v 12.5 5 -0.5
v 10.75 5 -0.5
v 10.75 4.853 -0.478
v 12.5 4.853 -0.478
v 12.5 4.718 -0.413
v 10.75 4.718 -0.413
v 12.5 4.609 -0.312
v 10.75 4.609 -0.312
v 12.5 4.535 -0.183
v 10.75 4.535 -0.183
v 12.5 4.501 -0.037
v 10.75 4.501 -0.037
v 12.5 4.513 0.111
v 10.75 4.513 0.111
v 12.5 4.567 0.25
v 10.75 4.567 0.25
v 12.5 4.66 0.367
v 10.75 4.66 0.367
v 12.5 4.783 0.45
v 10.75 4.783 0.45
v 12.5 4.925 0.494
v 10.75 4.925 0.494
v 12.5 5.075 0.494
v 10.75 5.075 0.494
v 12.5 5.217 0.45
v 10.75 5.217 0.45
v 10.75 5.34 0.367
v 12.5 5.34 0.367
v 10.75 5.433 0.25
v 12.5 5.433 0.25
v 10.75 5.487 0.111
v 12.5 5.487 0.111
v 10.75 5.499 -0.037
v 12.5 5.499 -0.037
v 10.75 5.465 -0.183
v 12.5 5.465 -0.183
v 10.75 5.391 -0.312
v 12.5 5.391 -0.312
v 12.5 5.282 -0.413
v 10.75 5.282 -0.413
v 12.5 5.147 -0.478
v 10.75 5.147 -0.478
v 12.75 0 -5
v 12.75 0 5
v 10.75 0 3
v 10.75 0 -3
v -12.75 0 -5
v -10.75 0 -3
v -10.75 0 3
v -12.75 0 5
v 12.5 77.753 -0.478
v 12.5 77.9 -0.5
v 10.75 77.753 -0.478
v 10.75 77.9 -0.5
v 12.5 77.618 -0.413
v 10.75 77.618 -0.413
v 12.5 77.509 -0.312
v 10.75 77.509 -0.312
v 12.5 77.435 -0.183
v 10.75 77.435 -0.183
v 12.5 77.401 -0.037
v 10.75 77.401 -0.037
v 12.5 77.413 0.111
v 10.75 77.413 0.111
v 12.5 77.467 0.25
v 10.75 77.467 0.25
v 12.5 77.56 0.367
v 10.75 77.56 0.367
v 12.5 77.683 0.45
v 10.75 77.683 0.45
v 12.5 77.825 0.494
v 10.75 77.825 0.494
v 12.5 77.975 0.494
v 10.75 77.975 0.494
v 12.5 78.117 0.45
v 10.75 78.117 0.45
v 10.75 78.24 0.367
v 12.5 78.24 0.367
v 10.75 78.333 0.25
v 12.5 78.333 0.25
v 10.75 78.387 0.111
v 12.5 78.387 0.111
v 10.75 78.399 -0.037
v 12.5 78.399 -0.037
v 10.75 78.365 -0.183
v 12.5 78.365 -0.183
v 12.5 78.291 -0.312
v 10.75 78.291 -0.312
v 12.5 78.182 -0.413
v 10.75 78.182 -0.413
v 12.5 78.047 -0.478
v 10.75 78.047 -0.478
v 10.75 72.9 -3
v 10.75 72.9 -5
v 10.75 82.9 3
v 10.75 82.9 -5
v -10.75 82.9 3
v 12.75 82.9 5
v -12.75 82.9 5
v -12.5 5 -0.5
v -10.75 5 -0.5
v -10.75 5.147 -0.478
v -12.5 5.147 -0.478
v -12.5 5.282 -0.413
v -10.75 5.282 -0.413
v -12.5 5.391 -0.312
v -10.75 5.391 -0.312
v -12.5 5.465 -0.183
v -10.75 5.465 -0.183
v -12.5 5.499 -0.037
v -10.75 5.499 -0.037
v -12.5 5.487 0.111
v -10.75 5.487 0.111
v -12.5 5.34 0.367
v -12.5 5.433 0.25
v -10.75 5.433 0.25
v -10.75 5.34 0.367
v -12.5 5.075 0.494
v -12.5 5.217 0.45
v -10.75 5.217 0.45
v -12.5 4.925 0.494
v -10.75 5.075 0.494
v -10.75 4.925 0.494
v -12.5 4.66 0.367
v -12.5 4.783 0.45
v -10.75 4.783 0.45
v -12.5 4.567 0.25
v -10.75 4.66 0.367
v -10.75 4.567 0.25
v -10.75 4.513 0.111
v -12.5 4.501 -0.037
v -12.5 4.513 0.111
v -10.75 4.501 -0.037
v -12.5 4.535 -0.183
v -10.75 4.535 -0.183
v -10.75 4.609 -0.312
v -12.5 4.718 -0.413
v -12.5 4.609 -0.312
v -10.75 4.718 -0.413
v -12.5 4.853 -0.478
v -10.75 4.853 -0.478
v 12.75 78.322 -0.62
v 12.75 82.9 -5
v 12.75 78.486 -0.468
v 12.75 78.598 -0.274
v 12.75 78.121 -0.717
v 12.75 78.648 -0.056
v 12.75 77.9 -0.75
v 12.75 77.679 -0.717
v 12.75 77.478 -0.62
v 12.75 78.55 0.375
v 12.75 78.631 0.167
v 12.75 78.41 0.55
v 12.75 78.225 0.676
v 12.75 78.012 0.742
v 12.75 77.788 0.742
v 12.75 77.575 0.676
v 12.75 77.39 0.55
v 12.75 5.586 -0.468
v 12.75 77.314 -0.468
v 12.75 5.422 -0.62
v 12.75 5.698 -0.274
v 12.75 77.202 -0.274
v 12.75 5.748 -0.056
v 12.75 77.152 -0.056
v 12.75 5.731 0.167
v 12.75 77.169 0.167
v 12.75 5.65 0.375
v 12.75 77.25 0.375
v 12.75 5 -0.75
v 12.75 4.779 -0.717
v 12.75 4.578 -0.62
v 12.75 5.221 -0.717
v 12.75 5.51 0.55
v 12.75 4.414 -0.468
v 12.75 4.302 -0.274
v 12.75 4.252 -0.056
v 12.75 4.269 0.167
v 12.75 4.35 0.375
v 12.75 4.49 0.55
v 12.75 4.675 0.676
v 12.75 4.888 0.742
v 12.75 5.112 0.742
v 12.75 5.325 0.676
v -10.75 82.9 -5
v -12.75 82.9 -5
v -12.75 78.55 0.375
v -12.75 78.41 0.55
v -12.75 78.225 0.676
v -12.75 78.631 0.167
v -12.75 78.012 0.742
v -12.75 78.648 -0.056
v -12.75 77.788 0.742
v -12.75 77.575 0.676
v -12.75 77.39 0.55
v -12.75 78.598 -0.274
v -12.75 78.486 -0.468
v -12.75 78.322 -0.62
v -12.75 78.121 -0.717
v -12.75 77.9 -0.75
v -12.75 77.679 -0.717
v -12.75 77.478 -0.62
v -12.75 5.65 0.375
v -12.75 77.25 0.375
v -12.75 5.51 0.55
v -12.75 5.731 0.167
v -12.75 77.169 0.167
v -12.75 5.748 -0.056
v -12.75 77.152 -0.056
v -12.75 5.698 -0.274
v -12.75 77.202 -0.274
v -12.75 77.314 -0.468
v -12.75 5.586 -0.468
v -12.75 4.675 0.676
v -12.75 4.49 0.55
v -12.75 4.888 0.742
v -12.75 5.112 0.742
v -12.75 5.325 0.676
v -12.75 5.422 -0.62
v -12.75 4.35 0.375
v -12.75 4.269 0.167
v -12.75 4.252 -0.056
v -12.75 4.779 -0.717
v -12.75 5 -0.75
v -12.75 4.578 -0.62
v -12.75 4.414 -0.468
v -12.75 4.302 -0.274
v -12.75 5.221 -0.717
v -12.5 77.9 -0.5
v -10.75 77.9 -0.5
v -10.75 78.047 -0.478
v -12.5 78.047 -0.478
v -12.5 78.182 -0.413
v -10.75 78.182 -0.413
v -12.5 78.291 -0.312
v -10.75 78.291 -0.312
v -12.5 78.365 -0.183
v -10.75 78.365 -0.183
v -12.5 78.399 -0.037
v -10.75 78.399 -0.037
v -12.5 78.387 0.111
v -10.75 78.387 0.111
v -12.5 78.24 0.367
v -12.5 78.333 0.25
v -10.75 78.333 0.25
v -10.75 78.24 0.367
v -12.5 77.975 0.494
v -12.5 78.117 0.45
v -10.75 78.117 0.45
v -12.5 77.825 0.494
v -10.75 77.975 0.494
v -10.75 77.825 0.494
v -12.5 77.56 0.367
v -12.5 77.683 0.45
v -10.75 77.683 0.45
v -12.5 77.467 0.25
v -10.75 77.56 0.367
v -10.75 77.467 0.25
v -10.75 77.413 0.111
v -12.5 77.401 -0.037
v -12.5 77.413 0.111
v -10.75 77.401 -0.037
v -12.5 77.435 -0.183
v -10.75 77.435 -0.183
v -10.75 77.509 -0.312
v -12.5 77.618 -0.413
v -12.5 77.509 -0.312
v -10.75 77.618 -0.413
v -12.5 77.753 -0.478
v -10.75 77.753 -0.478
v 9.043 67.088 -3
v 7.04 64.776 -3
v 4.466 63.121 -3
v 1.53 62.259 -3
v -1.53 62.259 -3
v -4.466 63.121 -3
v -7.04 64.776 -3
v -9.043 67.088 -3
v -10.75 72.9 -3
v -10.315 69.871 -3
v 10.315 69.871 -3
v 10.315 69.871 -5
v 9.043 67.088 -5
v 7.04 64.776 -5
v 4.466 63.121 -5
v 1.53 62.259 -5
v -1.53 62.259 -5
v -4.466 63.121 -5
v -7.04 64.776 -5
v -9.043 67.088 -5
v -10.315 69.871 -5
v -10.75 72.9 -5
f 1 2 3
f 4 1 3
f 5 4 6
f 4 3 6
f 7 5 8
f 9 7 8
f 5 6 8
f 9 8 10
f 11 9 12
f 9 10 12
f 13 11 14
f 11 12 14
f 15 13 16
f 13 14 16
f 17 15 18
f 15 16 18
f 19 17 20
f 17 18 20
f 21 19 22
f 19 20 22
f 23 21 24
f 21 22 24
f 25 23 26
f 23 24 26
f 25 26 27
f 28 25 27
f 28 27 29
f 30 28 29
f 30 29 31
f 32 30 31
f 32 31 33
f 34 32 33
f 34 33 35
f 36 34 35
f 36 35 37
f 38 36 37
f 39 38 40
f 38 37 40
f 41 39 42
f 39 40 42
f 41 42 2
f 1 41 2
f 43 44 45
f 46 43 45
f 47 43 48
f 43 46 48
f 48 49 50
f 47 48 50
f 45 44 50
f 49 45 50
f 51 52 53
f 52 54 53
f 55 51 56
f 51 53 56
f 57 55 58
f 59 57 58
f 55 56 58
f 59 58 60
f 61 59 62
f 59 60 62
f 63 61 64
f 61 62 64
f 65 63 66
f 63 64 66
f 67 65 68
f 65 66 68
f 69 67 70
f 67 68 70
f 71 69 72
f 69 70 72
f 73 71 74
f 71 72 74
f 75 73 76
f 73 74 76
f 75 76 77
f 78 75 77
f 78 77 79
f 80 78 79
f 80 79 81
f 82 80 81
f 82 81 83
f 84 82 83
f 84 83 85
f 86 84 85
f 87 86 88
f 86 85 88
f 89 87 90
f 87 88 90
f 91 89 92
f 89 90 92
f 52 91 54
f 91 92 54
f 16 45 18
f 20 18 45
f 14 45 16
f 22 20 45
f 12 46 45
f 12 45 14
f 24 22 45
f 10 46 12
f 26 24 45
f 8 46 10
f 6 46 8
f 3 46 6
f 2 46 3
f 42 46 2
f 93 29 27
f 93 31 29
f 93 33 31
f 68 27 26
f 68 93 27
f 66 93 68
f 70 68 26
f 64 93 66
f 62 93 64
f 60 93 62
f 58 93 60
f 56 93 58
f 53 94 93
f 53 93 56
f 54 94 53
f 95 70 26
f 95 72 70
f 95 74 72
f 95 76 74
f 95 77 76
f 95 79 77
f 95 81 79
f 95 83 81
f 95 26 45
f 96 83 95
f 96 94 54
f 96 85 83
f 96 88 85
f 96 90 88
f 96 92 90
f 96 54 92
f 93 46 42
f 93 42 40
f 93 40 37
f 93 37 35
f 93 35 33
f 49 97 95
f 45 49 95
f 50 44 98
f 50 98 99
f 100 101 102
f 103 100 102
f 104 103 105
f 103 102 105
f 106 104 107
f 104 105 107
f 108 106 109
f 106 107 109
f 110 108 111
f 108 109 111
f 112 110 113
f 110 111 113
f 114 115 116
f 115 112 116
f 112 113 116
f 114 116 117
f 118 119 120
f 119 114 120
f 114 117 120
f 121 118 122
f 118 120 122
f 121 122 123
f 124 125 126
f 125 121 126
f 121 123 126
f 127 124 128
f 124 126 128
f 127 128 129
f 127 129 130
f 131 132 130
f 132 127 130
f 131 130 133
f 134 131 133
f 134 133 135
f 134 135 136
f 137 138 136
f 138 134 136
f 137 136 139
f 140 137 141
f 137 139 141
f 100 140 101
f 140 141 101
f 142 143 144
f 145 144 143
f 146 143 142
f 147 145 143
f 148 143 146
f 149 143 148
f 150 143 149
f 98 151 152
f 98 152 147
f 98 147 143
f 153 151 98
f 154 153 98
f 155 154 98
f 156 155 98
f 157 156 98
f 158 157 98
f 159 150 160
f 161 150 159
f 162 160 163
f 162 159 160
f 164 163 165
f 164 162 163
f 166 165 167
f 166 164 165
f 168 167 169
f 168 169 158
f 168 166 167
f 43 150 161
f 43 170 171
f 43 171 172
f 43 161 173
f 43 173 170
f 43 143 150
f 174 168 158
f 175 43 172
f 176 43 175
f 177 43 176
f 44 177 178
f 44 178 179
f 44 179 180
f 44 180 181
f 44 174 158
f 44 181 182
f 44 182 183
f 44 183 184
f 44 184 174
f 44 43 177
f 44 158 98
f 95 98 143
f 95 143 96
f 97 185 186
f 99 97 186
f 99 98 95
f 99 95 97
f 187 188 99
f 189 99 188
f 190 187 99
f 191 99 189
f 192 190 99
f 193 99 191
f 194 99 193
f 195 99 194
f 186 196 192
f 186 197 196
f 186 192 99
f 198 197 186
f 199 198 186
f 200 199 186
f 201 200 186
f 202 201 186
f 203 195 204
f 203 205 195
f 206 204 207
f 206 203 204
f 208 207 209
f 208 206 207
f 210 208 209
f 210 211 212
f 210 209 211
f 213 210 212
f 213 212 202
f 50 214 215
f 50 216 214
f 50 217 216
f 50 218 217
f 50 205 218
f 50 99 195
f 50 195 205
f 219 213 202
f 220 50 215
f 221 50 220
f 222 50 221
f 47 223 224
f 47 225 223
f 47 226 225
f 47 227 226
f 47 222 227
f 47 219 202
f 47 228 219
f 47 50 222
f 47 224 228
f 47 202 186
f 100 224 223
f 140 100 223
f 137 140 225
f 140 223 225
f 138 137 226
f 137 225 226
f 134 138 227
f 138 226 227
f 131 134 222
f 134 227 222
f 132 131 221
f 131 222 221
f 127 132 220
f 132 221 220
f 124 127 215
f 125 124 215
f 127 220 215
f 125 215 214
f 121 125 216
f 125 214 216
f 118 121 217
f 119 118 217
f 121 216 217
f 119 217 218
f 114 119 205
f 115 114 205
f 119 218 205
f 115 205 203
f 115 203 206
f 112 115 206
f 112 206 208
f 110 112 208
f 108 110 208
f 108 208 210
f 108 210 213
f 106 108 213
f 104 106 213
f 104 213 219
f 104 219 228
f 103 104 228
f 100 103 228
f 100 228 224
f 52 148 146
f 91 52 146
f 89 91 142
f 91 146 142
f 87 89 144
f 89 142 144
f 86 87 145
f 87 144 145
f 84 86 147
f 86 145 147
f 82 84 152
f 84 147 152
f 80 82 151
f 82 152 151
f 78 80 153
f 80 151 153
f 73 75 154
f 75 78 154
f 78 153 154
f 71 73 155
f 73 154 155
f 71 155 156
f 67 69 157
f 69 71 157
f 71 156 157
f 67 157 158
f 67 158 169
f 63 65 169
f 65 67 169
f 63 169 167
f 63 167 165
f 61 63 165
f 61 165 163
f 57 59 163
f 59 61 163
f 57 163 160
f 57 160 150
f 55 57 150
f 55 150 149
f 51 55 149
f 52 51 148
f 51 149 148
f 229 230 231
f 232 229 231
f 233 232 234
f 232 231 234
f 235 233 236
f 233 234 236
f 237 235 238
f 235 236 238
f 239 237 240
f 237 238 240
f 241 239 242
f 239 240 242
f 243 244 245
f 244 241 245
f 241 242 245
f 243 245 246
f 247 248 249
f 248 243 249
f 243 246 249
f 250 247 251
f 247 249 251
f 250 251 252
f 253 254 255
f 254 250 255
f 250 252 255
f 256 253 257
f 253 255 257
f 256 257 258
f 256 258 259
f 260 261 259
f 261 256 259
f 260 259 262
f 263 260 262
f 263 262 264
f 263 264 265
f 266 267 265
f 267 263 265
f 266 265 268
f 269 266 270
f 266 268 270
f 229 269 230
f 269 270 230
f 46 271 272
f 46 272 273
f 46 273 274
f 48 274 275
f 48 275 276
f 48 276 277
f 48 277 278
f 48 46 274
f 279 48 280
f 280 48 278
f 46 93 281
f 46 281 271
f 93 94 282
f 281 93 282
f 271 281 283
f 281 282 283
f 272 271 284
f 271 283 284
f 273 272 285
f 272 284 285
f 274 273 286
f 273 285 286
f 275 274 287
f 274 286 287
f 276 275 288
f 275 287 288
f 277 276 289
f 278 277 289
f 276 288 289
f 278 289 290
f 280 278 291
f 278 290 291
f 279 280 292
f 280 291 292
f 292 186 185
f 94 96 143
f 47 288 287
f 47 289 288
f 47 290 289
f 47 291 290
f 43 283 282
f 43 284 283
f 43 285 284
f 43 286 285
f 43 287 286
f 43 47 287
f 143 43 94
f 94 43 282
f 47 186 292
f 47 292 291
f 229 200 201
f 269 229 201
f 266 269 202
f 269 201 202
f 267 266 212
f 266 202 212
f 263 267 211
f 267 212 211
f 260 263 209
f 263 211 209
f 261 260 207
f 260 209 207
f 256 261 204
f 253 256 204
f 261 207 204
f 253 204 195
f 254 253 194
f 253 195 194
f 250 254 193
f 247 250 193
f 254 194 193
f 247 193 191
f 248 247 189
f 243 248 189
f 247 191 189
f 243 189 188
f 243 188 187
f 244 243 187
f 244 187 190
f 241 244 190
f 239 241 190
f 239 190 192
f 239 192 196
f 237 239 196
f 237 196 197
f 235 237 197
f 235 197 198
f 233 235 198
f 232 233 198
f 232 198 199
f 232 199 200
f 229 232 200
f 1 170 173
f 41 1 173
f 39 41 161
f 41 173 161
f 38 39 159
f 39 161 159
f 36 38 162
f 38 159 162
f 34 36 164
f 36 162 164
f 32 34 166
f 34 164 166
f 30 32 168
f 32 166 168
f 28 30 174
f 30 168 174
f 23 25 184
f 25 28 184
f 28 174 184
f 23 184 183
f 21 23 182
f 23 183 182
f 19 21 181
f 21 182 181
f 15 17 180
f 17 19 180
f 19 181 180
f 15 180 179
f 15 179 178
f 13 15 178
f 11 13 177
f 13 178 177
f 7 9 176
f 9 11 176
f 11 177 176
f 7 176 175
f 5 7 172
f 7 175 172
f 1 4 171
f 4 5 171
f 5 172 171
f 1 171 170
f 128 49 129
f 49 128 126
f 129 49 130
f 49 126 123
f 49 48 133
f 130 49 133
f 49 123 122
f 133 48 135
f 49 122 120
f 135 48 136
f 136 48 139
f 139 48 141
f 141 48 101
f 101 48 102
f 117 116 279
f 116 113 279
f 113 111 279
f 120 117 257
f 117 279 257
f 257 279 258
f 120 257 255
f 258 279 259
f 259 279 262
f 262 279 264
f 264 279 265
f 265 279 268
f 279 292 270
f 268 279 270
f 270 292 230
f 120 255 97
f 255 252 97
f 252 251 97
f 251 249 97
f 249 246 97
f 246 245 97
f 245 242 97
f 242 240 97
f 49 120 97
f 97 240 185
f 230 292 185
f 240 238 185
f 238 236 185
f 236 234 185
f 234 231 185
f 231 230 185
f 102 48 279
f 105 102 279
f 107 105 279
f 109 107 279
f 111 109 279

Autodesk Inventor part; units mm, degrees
ref_plane "YZ Plane" through (0, 0, 0) normal (1, 0, 0) x (0, 1, 0)
ref_plane "XZ Plane" through (0, 0, 0) normal (0, 1, 0) x (-1, 0, 0)
ref_plane "XY Plane" through (0, 0, 0) normal (0, 0, 1) x (1, 0, 0)
sketch "Эскиз1" plane through (0, 0, 0) normal (0, 1, 0) x (-1, 0, 0)
  line L0 (12.75, -5) -> (-12.75, -5)
  line L1 (-12.75, -5) -> (-12.75, 5)
  line L2 (-12.75, 5) -> (12.75, 5)
  line L3 (12.75, 5) -> (12.75, -5)
  line L4 (-12.75, -5) -> (12.75, 5) construction
  line L5 (12.75, -5) -> (-12.75, 5) construction
  line L6 (-10.75, -3) -> (10.75, -3)
  line L7 (10.75, -3) -> (10.75, 3)
  line L8 (10.75, 3) -> (-10.75, 3)
  line L9 (-10.75, 3) -> (-10.75, -3)
  point P0 (0, 0)
  point P1 (0, 0)
  dimension "d0" = 25.5
  dimension "d1" = 10
  dimension "d2" = 2
extrude "Выдавливание1" add sketch "Эскиз1" along normal blind 82.9
sketch "Эскиз3" plane through (12.75, 0, -5) normal (0, 0, -1) x (-1, 0, 0)
  line L0 (0, 0) -> (0, 82.9) projected
  line L1 (25.5, 0) -> (25.5, 82.9) projected
  line L2 (25.5, 0) -> (25.5, 82.9) projected
  line L3 (0, 0) -> (0, 82.9) projected
  line L4 (0, 82.9) -> (25.5, 82.9) projected
  arc A0 (2, 72.9) -> (23.5, 72.9) centre (12.75, 72.9) ccw
  line L5 (23.5, 0) -> (23.5, 82.9) projected
  line L6 (2, 0) -> (2, 82.9) projected
  line L7 (23.5, 0) -> (23.5, 82.9) projected
  line L8 (23.5, 72.9) -> (23.5, 82.9)
  line L9 (23.5, 82.9) -> (2, 82.9)
  line L10 (2, 72.9) -> (2, 82.9)
  point P0 (12.75, 0)
  dimension "d10" = 10
extrude "Выдавливание3" cut sketch "Эскиз3" against normal up to surface (2 mm away)
sketch "Эскиз2" plane through (12.75, 0, 5) normal (1, 0, 0) x (0, 0, -1)
  line L0 (0, 82.9) -> (10, 82.9) construction
  line L1 (10, 82.9) -> (0, 72.9) construction
  line L2 (0, 0) -> (0, 82.9) construction
  line L3 (0, 82.9) -> (10, 72.9) construction
  line L4 (10, 0) -> (10, 82.9) construction
  line L5 (10, 0) -> (0, 10) construction
  line L6 (0, 0) -> (10, 10) construction
  circle A0 centre (5, 77.9) radius 0.5
  circle A1 centre (5, 5) radius 0.5
  point P0 (5, 0)
  dimension "d5" = 1
  dimension "d6" = 1
hole "Отверстие1" at (12.75, 77.9, 0) at (12.75, 5, 0) direction (-1, 0, 0) diameter 1 depth 2 countersink diameter 1.5 countersink angle 90
mirror "Зеркальное отражение1" about plane through (0, 0, 0) normal (1, 0, 0) of "Отверстие1"
properties part number "board-1-new"
